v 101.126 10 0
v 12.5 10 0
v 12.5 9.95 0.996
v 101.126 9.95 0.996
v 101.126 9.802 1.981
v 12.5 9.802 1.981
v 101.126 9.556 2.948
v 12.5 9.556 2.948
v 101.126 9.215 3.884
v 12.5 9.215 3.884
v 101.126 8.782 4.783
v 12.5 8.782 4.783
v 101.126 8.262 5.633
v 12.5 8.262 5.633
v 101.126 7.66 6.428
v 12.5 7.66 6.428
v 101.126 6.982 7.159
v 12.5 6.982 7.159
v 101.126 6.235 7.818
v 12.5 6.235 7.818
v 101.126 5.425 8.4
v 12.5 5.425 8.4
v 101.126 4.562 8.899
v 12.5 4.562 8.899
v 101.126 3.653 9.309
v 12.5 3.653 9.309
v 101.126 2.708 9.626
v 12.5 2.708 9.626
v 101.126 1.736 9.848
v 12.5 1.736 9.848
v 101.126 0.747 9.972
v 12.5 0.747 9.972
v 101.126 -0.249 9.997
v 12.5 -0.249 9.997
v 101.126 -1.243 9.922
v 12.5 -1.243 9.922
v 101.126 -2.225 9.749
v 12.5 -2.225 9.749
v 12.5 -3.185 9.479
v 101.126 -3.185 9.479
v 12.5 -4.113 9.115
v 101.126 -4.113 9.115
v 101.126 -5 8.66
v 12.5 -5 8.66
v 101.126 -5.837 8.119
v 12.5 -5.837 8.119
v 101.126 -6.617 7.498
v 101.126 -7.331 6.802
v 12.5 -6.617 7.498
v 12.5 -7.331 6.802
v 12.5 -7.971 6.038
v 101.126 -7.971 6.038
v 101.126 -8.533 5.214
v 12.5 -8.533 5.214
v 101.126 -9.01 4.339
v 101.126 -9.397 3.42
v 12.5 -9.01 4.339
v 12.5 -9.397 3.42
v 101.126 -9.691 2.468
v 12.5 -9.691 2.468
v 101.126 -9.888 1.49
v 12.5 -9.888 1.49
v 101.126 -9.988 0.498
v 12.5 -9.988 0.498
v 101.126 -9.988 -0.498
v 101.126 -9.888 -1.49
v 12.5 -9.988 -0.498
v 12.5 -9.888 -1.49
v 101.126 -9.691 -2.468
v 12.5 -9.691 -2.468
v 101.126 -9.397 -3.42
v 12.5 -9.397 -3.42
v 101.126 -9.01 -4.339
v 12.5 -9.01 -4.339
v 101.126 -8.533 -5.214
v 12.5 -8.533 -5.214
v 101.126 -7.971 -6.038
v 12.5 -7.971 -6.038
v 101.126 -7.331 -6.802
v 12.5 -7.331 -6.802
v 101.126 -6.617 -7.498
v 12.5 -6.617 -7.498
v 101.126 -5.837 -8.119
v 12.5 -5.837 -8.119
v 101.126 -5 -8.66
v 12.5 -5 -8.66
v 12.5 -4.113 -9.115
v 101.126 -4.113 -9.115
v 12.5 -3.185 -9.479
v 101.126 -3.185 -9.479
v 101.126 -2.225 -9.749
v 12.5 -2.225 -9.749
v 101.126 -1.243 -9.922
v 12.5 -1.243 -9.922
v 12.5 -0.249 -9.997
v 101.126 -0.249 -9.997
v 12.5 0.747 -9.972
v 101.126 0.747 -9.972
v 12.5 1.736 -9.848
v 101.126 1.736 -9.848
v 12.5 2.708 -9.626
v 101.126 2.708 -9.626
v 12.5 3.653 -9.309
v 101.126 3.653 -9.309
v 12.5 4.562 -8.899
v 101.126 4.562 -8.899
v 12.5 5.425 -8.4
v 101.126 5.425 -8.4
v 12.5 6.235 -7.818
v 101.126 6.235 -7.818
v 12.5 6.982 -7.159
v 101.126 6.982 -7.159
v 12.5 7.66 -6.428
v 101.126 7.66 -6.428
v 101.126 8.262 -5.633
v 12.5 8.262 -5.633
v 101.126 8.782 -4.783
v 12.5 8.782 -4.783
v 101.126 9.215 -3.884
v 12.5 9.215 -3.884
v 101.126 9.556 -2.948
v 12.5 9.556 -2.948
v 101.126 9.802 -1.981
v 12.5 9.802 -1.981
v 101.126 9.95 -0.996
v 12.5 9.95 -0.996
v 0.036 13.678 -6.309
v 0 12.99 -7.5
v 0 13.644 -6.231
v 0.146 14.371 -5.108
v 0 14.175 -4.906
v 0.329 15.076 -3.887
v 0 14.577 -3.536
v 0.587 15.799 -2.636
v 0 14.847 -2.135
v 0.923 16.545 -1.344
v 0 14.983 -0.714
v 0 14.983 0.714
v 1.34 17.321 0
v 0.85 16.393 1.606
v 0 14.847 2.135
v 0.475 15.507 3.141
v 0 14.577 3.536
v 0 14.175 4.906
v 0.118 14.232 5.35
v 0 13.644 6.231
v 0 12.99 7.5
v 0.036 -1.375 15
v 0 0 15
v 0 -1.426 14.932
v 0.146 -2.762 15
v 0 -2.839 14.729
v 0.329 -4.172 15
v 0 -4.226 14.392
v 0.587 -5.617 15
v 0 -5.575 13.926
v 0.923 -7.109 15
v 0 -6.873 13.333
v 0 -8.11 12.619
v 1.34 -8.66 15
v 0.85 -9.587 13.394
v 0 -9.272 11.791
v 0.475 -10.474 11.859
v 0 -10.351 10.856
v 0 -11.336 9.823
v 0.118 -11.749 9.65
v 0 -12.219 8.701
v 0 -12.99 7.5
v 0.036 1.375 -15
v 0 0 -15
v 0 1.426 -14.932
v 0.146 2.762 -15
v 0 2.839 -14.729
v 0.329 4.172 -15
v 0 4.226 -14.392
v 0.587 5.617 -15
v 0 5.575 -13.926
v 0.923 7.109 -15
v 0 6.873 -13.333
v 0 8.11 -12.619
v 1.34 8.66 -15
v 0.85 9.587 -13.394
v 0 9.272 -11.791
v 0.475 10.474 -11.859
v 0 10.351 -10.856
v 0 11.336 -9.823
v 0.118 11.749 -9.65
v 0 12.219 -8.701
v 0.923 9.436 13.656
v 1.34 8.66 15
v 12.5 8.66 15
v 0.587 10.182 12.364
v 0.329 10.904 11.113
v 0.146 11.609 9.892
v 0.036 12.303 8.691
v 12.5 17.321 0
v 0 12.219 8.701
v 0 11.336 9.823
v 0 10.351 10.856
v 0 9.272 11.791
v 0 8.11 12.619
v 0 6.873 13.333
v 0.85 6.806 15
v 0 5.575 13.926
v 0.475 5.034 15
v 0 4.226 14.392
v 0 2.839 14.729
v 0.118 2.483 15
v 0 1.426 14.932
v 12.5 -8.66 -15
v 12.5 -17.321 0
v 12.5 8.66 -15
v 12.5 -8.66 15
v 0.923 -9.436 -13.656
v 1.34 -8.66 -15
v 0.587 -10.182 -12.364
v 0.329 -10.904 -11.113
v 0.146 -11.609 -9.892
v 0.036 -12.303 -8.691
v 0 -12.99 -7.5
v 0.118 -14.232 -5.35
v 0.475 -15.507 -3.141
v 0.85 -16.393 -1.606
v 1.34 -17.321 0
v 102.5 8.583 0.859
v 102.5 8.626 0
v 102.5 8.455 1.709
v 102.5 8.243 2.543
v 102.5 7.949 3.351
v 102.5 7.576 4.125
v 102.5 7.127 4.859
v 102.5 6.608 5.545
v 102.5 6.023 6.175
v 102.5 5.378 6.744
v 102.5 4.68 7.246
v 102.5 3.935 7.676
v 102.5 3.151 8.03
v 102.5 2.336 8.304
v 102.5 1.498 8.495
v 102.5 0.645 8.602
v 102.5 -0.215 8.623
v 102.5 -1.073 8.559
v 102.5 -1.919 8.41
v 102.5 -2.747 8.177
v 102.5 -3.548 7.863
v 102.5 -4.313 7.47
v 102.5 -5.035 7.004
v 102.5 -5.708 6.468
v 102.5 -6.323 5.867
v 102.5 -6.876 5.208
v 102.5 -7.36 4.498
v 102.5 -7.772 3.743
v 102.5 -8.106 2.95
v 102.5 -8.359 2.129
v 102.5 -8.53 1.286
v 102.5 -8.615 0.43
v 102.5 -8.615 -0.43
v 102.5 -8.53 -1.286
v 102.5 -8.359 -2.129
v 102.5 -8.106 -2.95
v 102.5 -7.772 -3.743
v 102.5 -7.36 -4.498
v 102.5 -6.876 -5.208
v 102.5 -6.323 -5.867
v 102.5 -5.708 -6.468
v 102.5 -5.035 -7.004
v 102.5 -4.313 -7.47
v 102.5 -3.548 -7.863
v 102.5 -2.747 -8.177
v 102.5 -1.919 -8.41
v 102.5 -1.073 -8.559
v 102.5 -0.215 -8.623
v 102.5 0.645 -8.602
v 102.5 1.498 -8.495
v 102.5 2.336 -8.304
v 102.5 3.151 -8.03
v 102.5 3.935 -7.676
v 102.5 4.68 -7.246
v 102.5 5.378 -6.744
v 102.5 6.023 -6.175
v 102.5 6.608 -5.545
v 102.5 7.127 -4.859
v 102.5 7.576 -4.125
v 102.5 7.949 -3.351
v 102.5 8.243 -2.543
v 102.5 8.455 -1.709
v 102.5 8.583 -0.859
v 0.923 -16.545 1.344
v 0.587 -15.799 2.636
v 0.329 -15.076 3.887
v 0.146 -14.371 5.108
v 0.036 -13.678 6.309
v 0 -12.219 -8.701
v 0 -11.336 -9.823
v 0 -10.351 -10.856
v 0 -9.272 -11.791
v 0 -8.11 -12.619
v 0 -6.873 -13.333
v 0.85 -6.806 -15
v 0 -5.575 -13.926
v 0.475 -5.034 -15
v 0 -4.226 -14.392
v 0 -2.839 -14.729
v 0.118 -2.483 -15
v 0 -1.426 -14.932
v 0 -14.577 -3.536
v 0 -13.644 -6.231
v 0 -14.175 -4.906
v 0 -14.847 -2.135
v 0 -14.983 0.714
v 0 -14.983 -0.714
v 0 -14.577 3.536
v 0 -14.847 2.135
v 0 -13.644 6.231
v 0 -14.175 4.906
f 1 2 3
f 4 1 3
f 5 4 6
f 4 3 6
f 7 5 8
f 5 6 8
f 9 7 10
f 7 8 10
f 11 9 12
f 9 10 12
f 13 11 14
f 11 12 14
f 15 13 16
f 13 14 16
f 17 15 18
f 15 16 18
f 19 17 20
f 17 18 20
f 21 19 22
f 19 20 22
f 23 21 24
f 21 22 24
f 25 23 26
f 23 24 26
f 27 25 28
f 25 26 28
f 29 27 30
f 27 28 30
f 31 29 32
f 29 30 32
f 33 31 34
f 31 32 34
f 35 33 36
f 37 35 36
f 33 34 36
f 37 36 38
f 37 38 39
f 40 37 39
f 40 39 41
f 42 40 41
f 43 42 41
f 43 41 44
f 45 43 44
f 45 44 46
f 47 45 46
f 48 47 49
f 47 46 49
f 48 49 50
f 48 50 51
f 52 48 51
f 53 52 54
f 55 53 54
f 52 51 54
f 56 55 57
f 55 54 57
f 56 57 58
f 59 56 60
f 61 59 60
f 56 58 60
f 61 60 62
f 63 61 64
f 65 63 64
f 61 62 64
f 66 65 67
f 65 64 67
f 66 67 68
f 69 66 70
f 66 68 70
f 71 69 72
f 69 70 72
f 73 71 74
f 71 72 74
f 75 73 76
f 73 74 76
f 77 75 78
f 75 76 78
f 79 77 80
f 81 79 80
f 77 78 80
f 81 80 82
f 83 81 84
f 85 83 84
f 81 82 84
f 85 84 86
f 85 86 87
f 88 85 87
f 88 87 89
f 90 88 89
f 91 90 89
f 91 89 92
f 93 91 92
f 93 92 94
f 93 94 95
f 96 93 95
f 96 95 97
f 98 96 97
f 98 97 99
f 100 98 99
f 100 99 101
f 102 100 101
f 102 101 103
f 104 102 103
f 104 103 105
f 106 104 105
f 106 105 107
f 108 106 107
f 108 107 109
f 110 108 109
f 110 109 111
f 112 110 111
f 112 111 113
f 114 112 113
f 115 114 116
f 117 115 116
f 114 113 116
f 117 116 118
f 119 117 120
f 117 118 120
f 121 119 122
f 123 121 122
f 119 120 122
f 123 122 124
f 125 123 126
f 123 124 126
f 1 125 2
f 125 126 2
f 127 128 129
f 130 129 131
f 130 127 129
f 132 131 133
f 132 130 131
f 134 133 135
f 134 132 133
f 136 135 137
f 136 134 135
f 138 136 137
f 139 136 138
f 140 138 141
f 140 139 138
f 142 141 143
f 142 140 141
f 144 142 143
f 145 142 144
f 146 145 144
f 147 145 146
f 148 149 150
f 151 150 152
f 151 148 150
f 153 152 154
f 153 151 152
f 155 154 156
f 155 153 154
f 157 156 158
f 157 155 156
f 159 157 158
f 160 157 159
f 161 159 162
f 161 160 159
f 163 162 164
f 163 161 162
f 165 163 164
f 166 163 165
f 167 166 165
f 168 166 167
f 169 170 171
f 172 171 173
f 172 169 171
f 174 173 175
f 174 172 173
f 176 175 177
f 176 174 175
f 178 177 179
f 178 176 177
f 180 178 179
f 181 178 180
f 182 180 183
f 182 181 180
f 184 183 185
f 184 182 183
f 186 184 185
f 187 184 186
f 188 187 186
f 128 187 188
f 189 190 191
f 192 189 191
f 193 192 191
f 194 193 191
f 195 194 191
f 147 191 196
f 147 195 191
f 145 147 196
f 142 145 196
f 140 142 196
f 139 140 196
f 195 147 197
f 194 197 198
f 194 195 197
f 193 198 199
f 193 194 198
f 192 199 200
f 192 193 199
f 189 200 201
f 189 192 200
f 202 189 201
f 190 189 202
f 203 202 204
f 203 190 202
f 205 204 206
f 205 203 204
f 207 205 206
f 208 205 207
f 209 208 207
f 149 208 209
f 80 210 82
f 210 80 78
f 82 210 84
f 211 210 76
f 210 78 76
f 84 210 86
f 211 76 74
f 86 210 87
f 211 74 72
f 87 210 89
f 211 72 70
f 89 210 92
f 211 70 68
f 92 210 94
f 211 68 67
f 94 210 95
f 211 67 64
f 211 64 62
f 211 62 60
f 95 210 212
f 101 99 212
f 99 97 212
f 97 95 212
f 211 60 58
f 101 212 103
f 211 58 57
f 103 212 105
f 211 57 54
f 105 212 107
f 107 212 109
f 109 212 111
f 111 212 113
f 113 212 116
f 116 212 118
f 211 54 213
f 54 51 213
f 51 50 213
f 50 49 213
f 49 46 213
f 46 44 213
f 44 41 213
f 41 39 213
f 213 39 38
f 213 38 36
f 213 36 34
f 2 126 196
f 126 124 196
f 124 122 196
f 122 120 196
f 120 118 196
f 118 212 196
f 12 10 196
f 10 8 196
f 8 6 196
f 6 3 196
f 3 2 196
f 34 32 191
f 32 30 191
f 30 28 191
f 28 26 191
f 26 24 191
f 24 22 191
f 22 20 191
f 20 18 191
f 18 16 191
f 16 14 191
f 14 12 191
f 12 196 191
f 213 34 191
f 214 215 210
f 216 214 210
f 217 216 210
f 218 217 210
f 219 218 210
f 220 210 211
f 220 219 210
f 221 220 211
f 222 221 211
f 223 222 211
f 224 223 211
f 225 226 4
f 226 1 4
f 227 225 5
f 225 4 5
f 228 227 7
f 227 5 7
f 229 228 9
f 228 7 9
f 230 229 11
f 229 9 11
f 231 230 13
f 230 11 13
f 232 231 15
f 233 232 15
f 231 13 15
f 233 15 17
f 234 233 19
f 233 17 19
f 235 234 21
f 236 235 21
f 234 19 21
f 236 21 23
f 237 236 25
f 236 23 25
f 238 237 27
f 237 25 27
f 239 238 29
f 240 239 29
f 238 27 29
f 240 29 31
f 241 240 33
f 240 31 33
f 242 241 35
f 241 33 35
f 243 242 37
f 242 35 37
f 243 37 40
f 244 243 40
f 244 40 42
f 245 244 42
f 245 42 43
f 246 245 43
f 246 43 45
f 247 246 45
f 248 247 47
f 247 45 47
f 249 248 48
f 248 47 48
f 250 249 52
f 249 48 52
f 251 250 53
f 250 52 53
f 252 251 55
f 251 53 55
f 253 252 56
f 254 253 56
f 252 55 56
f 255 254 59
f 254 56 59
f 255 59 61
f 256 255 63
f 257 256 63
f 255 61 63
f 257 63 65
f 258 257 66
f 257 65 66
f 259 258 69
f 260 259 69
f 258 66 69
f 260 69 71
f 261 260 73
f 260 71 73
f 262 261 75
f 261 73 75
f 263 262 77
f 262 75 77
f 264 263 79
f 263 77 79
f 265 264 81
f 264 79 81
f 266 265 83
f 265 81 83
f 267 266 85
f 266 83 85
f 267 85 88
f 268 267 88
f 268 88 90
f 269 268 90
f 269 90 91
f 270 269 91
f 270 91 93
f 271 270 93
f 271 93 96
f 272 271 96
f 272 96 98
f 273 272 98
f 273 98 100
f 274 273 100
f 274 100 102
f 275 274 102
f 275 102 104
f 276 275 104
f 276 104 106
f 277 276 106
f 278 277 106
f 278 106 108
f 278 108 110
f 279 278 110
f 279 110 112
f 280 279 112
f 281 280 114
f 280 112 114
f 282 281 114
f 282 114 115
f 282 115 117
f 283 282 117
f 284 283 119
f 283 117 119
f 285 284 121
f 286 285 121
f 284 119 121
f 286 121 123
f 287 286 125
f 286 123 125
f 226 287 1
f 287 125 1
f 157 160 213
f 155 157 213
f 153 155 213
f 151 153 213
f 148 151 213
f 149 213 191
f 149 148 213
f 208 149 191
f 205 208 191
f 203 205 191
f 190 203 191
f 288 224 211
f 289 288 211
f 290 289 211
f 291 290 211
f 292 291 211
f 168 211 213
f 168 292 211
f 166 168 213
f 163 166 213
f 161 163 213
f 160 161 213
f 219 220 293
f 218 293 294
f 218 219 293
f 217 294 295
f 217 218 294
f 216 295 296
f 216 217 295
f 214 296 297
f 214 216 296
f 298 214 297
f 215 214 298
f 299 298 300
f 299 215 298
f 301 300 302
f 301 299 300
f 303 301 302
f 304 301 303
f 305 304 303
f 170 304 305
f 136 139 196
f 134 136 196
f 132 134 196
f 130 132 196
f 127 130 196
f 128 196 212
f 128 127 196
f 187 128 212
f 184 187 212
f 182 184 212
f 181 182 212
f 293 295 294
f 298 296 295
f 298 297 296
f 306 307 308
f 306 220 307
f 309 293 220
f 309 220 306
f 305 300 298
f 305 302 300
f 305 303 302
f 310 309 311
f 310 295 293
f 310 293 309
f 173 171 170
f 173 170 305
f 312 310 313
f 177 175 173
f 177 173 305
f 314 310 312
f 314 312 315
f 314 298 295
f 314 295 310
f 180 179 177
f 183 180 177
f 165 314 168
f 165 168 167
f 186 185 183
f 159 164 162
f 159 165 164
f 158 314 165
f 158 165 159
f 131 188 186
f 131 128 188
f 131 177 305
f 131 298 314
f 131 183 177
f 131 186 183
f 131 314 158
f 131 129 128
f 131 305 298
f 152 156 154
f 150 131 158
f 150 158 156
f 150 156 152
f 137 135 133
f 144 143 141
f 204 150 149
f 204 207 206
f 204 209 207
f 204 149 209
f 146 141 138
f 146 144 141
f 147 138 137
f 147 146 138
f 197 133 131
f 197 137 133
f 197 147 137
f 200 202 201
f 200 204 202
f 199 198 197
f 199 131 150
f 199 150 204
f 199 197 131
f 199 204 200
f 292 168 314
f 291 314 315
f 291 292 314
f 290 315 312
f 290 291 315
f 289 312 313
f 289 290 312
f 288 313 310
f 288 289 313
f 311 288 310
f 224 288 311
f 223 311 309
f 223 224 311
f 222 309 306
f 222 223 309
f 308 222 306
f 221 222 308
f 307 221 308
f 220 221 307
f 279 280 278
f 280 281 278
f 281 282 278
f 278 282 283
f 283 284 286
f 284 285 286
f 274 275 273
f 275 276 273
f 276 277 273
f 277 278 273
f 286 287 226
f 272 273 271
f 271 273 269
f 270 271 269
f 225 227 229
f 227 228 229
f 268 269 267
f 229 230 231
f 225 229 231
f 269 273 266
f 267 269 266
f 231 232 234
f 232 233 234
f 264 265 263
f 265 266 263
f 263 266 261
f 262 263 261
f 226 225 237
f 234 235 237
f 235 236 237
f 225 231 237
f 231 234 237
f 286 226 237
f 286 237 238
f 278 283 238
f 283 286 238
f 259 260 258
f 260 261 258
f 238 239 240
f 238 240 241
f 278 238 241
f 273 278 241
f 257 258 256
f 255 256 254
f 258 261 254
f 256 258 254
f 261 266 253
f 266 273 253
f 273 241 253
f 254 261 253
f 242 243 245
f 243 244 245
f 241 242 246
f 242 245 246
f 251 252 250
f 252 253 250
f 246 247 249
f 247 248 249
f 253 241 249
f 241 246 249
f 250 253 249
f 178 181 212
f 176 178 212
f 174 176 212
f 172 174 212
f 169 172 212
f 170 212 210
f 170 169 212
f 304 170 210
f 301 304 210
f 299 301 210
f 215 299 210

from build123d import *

# Parameters (mm, degrees)
BASEHEAD_DEPTH = 12.5


with BuildPart() as part:
    # Sketch1 → BaseHead (new body)
    with BuildSketch(Plane(origin=(0, 0, 0), x_dir=(0, 0, -1), z_dir=(1, 0, 0))):
        Polygon((15, 8.660254038), (15, -8.660254038), (0, -17.320508076), (-15, -8.660254038), (-15, 8.660254038), (0, 17.320508076), align=None)
    extrude(amount=BASEHEAD_DEPTH)

    # BodySke → BaseBody (revolve)
    with BuildSketch(Plane.XY):
        Polygon((0, 0), (102.5, 0), (102.5, 8.626), (101.126, 10), (0, 10), align=None)
    revolve(axis=Axis((0, 0, 0), (1, 0, 0)))

    # Sketch3 → HeadChamfer (revolve, cut)
    with BuildSketch(Plane.XY):
        Polygon((0, 15), (4.226497308, 22.320508076), (4.226497308, 27.320508076), (-10, 27.320508076), (-10, 15), align=None)
    revolve(axis=Axis((0, 0, 0), (1, 0, 0)), mode=Mode.SUBTRACT)


solid = part.part
